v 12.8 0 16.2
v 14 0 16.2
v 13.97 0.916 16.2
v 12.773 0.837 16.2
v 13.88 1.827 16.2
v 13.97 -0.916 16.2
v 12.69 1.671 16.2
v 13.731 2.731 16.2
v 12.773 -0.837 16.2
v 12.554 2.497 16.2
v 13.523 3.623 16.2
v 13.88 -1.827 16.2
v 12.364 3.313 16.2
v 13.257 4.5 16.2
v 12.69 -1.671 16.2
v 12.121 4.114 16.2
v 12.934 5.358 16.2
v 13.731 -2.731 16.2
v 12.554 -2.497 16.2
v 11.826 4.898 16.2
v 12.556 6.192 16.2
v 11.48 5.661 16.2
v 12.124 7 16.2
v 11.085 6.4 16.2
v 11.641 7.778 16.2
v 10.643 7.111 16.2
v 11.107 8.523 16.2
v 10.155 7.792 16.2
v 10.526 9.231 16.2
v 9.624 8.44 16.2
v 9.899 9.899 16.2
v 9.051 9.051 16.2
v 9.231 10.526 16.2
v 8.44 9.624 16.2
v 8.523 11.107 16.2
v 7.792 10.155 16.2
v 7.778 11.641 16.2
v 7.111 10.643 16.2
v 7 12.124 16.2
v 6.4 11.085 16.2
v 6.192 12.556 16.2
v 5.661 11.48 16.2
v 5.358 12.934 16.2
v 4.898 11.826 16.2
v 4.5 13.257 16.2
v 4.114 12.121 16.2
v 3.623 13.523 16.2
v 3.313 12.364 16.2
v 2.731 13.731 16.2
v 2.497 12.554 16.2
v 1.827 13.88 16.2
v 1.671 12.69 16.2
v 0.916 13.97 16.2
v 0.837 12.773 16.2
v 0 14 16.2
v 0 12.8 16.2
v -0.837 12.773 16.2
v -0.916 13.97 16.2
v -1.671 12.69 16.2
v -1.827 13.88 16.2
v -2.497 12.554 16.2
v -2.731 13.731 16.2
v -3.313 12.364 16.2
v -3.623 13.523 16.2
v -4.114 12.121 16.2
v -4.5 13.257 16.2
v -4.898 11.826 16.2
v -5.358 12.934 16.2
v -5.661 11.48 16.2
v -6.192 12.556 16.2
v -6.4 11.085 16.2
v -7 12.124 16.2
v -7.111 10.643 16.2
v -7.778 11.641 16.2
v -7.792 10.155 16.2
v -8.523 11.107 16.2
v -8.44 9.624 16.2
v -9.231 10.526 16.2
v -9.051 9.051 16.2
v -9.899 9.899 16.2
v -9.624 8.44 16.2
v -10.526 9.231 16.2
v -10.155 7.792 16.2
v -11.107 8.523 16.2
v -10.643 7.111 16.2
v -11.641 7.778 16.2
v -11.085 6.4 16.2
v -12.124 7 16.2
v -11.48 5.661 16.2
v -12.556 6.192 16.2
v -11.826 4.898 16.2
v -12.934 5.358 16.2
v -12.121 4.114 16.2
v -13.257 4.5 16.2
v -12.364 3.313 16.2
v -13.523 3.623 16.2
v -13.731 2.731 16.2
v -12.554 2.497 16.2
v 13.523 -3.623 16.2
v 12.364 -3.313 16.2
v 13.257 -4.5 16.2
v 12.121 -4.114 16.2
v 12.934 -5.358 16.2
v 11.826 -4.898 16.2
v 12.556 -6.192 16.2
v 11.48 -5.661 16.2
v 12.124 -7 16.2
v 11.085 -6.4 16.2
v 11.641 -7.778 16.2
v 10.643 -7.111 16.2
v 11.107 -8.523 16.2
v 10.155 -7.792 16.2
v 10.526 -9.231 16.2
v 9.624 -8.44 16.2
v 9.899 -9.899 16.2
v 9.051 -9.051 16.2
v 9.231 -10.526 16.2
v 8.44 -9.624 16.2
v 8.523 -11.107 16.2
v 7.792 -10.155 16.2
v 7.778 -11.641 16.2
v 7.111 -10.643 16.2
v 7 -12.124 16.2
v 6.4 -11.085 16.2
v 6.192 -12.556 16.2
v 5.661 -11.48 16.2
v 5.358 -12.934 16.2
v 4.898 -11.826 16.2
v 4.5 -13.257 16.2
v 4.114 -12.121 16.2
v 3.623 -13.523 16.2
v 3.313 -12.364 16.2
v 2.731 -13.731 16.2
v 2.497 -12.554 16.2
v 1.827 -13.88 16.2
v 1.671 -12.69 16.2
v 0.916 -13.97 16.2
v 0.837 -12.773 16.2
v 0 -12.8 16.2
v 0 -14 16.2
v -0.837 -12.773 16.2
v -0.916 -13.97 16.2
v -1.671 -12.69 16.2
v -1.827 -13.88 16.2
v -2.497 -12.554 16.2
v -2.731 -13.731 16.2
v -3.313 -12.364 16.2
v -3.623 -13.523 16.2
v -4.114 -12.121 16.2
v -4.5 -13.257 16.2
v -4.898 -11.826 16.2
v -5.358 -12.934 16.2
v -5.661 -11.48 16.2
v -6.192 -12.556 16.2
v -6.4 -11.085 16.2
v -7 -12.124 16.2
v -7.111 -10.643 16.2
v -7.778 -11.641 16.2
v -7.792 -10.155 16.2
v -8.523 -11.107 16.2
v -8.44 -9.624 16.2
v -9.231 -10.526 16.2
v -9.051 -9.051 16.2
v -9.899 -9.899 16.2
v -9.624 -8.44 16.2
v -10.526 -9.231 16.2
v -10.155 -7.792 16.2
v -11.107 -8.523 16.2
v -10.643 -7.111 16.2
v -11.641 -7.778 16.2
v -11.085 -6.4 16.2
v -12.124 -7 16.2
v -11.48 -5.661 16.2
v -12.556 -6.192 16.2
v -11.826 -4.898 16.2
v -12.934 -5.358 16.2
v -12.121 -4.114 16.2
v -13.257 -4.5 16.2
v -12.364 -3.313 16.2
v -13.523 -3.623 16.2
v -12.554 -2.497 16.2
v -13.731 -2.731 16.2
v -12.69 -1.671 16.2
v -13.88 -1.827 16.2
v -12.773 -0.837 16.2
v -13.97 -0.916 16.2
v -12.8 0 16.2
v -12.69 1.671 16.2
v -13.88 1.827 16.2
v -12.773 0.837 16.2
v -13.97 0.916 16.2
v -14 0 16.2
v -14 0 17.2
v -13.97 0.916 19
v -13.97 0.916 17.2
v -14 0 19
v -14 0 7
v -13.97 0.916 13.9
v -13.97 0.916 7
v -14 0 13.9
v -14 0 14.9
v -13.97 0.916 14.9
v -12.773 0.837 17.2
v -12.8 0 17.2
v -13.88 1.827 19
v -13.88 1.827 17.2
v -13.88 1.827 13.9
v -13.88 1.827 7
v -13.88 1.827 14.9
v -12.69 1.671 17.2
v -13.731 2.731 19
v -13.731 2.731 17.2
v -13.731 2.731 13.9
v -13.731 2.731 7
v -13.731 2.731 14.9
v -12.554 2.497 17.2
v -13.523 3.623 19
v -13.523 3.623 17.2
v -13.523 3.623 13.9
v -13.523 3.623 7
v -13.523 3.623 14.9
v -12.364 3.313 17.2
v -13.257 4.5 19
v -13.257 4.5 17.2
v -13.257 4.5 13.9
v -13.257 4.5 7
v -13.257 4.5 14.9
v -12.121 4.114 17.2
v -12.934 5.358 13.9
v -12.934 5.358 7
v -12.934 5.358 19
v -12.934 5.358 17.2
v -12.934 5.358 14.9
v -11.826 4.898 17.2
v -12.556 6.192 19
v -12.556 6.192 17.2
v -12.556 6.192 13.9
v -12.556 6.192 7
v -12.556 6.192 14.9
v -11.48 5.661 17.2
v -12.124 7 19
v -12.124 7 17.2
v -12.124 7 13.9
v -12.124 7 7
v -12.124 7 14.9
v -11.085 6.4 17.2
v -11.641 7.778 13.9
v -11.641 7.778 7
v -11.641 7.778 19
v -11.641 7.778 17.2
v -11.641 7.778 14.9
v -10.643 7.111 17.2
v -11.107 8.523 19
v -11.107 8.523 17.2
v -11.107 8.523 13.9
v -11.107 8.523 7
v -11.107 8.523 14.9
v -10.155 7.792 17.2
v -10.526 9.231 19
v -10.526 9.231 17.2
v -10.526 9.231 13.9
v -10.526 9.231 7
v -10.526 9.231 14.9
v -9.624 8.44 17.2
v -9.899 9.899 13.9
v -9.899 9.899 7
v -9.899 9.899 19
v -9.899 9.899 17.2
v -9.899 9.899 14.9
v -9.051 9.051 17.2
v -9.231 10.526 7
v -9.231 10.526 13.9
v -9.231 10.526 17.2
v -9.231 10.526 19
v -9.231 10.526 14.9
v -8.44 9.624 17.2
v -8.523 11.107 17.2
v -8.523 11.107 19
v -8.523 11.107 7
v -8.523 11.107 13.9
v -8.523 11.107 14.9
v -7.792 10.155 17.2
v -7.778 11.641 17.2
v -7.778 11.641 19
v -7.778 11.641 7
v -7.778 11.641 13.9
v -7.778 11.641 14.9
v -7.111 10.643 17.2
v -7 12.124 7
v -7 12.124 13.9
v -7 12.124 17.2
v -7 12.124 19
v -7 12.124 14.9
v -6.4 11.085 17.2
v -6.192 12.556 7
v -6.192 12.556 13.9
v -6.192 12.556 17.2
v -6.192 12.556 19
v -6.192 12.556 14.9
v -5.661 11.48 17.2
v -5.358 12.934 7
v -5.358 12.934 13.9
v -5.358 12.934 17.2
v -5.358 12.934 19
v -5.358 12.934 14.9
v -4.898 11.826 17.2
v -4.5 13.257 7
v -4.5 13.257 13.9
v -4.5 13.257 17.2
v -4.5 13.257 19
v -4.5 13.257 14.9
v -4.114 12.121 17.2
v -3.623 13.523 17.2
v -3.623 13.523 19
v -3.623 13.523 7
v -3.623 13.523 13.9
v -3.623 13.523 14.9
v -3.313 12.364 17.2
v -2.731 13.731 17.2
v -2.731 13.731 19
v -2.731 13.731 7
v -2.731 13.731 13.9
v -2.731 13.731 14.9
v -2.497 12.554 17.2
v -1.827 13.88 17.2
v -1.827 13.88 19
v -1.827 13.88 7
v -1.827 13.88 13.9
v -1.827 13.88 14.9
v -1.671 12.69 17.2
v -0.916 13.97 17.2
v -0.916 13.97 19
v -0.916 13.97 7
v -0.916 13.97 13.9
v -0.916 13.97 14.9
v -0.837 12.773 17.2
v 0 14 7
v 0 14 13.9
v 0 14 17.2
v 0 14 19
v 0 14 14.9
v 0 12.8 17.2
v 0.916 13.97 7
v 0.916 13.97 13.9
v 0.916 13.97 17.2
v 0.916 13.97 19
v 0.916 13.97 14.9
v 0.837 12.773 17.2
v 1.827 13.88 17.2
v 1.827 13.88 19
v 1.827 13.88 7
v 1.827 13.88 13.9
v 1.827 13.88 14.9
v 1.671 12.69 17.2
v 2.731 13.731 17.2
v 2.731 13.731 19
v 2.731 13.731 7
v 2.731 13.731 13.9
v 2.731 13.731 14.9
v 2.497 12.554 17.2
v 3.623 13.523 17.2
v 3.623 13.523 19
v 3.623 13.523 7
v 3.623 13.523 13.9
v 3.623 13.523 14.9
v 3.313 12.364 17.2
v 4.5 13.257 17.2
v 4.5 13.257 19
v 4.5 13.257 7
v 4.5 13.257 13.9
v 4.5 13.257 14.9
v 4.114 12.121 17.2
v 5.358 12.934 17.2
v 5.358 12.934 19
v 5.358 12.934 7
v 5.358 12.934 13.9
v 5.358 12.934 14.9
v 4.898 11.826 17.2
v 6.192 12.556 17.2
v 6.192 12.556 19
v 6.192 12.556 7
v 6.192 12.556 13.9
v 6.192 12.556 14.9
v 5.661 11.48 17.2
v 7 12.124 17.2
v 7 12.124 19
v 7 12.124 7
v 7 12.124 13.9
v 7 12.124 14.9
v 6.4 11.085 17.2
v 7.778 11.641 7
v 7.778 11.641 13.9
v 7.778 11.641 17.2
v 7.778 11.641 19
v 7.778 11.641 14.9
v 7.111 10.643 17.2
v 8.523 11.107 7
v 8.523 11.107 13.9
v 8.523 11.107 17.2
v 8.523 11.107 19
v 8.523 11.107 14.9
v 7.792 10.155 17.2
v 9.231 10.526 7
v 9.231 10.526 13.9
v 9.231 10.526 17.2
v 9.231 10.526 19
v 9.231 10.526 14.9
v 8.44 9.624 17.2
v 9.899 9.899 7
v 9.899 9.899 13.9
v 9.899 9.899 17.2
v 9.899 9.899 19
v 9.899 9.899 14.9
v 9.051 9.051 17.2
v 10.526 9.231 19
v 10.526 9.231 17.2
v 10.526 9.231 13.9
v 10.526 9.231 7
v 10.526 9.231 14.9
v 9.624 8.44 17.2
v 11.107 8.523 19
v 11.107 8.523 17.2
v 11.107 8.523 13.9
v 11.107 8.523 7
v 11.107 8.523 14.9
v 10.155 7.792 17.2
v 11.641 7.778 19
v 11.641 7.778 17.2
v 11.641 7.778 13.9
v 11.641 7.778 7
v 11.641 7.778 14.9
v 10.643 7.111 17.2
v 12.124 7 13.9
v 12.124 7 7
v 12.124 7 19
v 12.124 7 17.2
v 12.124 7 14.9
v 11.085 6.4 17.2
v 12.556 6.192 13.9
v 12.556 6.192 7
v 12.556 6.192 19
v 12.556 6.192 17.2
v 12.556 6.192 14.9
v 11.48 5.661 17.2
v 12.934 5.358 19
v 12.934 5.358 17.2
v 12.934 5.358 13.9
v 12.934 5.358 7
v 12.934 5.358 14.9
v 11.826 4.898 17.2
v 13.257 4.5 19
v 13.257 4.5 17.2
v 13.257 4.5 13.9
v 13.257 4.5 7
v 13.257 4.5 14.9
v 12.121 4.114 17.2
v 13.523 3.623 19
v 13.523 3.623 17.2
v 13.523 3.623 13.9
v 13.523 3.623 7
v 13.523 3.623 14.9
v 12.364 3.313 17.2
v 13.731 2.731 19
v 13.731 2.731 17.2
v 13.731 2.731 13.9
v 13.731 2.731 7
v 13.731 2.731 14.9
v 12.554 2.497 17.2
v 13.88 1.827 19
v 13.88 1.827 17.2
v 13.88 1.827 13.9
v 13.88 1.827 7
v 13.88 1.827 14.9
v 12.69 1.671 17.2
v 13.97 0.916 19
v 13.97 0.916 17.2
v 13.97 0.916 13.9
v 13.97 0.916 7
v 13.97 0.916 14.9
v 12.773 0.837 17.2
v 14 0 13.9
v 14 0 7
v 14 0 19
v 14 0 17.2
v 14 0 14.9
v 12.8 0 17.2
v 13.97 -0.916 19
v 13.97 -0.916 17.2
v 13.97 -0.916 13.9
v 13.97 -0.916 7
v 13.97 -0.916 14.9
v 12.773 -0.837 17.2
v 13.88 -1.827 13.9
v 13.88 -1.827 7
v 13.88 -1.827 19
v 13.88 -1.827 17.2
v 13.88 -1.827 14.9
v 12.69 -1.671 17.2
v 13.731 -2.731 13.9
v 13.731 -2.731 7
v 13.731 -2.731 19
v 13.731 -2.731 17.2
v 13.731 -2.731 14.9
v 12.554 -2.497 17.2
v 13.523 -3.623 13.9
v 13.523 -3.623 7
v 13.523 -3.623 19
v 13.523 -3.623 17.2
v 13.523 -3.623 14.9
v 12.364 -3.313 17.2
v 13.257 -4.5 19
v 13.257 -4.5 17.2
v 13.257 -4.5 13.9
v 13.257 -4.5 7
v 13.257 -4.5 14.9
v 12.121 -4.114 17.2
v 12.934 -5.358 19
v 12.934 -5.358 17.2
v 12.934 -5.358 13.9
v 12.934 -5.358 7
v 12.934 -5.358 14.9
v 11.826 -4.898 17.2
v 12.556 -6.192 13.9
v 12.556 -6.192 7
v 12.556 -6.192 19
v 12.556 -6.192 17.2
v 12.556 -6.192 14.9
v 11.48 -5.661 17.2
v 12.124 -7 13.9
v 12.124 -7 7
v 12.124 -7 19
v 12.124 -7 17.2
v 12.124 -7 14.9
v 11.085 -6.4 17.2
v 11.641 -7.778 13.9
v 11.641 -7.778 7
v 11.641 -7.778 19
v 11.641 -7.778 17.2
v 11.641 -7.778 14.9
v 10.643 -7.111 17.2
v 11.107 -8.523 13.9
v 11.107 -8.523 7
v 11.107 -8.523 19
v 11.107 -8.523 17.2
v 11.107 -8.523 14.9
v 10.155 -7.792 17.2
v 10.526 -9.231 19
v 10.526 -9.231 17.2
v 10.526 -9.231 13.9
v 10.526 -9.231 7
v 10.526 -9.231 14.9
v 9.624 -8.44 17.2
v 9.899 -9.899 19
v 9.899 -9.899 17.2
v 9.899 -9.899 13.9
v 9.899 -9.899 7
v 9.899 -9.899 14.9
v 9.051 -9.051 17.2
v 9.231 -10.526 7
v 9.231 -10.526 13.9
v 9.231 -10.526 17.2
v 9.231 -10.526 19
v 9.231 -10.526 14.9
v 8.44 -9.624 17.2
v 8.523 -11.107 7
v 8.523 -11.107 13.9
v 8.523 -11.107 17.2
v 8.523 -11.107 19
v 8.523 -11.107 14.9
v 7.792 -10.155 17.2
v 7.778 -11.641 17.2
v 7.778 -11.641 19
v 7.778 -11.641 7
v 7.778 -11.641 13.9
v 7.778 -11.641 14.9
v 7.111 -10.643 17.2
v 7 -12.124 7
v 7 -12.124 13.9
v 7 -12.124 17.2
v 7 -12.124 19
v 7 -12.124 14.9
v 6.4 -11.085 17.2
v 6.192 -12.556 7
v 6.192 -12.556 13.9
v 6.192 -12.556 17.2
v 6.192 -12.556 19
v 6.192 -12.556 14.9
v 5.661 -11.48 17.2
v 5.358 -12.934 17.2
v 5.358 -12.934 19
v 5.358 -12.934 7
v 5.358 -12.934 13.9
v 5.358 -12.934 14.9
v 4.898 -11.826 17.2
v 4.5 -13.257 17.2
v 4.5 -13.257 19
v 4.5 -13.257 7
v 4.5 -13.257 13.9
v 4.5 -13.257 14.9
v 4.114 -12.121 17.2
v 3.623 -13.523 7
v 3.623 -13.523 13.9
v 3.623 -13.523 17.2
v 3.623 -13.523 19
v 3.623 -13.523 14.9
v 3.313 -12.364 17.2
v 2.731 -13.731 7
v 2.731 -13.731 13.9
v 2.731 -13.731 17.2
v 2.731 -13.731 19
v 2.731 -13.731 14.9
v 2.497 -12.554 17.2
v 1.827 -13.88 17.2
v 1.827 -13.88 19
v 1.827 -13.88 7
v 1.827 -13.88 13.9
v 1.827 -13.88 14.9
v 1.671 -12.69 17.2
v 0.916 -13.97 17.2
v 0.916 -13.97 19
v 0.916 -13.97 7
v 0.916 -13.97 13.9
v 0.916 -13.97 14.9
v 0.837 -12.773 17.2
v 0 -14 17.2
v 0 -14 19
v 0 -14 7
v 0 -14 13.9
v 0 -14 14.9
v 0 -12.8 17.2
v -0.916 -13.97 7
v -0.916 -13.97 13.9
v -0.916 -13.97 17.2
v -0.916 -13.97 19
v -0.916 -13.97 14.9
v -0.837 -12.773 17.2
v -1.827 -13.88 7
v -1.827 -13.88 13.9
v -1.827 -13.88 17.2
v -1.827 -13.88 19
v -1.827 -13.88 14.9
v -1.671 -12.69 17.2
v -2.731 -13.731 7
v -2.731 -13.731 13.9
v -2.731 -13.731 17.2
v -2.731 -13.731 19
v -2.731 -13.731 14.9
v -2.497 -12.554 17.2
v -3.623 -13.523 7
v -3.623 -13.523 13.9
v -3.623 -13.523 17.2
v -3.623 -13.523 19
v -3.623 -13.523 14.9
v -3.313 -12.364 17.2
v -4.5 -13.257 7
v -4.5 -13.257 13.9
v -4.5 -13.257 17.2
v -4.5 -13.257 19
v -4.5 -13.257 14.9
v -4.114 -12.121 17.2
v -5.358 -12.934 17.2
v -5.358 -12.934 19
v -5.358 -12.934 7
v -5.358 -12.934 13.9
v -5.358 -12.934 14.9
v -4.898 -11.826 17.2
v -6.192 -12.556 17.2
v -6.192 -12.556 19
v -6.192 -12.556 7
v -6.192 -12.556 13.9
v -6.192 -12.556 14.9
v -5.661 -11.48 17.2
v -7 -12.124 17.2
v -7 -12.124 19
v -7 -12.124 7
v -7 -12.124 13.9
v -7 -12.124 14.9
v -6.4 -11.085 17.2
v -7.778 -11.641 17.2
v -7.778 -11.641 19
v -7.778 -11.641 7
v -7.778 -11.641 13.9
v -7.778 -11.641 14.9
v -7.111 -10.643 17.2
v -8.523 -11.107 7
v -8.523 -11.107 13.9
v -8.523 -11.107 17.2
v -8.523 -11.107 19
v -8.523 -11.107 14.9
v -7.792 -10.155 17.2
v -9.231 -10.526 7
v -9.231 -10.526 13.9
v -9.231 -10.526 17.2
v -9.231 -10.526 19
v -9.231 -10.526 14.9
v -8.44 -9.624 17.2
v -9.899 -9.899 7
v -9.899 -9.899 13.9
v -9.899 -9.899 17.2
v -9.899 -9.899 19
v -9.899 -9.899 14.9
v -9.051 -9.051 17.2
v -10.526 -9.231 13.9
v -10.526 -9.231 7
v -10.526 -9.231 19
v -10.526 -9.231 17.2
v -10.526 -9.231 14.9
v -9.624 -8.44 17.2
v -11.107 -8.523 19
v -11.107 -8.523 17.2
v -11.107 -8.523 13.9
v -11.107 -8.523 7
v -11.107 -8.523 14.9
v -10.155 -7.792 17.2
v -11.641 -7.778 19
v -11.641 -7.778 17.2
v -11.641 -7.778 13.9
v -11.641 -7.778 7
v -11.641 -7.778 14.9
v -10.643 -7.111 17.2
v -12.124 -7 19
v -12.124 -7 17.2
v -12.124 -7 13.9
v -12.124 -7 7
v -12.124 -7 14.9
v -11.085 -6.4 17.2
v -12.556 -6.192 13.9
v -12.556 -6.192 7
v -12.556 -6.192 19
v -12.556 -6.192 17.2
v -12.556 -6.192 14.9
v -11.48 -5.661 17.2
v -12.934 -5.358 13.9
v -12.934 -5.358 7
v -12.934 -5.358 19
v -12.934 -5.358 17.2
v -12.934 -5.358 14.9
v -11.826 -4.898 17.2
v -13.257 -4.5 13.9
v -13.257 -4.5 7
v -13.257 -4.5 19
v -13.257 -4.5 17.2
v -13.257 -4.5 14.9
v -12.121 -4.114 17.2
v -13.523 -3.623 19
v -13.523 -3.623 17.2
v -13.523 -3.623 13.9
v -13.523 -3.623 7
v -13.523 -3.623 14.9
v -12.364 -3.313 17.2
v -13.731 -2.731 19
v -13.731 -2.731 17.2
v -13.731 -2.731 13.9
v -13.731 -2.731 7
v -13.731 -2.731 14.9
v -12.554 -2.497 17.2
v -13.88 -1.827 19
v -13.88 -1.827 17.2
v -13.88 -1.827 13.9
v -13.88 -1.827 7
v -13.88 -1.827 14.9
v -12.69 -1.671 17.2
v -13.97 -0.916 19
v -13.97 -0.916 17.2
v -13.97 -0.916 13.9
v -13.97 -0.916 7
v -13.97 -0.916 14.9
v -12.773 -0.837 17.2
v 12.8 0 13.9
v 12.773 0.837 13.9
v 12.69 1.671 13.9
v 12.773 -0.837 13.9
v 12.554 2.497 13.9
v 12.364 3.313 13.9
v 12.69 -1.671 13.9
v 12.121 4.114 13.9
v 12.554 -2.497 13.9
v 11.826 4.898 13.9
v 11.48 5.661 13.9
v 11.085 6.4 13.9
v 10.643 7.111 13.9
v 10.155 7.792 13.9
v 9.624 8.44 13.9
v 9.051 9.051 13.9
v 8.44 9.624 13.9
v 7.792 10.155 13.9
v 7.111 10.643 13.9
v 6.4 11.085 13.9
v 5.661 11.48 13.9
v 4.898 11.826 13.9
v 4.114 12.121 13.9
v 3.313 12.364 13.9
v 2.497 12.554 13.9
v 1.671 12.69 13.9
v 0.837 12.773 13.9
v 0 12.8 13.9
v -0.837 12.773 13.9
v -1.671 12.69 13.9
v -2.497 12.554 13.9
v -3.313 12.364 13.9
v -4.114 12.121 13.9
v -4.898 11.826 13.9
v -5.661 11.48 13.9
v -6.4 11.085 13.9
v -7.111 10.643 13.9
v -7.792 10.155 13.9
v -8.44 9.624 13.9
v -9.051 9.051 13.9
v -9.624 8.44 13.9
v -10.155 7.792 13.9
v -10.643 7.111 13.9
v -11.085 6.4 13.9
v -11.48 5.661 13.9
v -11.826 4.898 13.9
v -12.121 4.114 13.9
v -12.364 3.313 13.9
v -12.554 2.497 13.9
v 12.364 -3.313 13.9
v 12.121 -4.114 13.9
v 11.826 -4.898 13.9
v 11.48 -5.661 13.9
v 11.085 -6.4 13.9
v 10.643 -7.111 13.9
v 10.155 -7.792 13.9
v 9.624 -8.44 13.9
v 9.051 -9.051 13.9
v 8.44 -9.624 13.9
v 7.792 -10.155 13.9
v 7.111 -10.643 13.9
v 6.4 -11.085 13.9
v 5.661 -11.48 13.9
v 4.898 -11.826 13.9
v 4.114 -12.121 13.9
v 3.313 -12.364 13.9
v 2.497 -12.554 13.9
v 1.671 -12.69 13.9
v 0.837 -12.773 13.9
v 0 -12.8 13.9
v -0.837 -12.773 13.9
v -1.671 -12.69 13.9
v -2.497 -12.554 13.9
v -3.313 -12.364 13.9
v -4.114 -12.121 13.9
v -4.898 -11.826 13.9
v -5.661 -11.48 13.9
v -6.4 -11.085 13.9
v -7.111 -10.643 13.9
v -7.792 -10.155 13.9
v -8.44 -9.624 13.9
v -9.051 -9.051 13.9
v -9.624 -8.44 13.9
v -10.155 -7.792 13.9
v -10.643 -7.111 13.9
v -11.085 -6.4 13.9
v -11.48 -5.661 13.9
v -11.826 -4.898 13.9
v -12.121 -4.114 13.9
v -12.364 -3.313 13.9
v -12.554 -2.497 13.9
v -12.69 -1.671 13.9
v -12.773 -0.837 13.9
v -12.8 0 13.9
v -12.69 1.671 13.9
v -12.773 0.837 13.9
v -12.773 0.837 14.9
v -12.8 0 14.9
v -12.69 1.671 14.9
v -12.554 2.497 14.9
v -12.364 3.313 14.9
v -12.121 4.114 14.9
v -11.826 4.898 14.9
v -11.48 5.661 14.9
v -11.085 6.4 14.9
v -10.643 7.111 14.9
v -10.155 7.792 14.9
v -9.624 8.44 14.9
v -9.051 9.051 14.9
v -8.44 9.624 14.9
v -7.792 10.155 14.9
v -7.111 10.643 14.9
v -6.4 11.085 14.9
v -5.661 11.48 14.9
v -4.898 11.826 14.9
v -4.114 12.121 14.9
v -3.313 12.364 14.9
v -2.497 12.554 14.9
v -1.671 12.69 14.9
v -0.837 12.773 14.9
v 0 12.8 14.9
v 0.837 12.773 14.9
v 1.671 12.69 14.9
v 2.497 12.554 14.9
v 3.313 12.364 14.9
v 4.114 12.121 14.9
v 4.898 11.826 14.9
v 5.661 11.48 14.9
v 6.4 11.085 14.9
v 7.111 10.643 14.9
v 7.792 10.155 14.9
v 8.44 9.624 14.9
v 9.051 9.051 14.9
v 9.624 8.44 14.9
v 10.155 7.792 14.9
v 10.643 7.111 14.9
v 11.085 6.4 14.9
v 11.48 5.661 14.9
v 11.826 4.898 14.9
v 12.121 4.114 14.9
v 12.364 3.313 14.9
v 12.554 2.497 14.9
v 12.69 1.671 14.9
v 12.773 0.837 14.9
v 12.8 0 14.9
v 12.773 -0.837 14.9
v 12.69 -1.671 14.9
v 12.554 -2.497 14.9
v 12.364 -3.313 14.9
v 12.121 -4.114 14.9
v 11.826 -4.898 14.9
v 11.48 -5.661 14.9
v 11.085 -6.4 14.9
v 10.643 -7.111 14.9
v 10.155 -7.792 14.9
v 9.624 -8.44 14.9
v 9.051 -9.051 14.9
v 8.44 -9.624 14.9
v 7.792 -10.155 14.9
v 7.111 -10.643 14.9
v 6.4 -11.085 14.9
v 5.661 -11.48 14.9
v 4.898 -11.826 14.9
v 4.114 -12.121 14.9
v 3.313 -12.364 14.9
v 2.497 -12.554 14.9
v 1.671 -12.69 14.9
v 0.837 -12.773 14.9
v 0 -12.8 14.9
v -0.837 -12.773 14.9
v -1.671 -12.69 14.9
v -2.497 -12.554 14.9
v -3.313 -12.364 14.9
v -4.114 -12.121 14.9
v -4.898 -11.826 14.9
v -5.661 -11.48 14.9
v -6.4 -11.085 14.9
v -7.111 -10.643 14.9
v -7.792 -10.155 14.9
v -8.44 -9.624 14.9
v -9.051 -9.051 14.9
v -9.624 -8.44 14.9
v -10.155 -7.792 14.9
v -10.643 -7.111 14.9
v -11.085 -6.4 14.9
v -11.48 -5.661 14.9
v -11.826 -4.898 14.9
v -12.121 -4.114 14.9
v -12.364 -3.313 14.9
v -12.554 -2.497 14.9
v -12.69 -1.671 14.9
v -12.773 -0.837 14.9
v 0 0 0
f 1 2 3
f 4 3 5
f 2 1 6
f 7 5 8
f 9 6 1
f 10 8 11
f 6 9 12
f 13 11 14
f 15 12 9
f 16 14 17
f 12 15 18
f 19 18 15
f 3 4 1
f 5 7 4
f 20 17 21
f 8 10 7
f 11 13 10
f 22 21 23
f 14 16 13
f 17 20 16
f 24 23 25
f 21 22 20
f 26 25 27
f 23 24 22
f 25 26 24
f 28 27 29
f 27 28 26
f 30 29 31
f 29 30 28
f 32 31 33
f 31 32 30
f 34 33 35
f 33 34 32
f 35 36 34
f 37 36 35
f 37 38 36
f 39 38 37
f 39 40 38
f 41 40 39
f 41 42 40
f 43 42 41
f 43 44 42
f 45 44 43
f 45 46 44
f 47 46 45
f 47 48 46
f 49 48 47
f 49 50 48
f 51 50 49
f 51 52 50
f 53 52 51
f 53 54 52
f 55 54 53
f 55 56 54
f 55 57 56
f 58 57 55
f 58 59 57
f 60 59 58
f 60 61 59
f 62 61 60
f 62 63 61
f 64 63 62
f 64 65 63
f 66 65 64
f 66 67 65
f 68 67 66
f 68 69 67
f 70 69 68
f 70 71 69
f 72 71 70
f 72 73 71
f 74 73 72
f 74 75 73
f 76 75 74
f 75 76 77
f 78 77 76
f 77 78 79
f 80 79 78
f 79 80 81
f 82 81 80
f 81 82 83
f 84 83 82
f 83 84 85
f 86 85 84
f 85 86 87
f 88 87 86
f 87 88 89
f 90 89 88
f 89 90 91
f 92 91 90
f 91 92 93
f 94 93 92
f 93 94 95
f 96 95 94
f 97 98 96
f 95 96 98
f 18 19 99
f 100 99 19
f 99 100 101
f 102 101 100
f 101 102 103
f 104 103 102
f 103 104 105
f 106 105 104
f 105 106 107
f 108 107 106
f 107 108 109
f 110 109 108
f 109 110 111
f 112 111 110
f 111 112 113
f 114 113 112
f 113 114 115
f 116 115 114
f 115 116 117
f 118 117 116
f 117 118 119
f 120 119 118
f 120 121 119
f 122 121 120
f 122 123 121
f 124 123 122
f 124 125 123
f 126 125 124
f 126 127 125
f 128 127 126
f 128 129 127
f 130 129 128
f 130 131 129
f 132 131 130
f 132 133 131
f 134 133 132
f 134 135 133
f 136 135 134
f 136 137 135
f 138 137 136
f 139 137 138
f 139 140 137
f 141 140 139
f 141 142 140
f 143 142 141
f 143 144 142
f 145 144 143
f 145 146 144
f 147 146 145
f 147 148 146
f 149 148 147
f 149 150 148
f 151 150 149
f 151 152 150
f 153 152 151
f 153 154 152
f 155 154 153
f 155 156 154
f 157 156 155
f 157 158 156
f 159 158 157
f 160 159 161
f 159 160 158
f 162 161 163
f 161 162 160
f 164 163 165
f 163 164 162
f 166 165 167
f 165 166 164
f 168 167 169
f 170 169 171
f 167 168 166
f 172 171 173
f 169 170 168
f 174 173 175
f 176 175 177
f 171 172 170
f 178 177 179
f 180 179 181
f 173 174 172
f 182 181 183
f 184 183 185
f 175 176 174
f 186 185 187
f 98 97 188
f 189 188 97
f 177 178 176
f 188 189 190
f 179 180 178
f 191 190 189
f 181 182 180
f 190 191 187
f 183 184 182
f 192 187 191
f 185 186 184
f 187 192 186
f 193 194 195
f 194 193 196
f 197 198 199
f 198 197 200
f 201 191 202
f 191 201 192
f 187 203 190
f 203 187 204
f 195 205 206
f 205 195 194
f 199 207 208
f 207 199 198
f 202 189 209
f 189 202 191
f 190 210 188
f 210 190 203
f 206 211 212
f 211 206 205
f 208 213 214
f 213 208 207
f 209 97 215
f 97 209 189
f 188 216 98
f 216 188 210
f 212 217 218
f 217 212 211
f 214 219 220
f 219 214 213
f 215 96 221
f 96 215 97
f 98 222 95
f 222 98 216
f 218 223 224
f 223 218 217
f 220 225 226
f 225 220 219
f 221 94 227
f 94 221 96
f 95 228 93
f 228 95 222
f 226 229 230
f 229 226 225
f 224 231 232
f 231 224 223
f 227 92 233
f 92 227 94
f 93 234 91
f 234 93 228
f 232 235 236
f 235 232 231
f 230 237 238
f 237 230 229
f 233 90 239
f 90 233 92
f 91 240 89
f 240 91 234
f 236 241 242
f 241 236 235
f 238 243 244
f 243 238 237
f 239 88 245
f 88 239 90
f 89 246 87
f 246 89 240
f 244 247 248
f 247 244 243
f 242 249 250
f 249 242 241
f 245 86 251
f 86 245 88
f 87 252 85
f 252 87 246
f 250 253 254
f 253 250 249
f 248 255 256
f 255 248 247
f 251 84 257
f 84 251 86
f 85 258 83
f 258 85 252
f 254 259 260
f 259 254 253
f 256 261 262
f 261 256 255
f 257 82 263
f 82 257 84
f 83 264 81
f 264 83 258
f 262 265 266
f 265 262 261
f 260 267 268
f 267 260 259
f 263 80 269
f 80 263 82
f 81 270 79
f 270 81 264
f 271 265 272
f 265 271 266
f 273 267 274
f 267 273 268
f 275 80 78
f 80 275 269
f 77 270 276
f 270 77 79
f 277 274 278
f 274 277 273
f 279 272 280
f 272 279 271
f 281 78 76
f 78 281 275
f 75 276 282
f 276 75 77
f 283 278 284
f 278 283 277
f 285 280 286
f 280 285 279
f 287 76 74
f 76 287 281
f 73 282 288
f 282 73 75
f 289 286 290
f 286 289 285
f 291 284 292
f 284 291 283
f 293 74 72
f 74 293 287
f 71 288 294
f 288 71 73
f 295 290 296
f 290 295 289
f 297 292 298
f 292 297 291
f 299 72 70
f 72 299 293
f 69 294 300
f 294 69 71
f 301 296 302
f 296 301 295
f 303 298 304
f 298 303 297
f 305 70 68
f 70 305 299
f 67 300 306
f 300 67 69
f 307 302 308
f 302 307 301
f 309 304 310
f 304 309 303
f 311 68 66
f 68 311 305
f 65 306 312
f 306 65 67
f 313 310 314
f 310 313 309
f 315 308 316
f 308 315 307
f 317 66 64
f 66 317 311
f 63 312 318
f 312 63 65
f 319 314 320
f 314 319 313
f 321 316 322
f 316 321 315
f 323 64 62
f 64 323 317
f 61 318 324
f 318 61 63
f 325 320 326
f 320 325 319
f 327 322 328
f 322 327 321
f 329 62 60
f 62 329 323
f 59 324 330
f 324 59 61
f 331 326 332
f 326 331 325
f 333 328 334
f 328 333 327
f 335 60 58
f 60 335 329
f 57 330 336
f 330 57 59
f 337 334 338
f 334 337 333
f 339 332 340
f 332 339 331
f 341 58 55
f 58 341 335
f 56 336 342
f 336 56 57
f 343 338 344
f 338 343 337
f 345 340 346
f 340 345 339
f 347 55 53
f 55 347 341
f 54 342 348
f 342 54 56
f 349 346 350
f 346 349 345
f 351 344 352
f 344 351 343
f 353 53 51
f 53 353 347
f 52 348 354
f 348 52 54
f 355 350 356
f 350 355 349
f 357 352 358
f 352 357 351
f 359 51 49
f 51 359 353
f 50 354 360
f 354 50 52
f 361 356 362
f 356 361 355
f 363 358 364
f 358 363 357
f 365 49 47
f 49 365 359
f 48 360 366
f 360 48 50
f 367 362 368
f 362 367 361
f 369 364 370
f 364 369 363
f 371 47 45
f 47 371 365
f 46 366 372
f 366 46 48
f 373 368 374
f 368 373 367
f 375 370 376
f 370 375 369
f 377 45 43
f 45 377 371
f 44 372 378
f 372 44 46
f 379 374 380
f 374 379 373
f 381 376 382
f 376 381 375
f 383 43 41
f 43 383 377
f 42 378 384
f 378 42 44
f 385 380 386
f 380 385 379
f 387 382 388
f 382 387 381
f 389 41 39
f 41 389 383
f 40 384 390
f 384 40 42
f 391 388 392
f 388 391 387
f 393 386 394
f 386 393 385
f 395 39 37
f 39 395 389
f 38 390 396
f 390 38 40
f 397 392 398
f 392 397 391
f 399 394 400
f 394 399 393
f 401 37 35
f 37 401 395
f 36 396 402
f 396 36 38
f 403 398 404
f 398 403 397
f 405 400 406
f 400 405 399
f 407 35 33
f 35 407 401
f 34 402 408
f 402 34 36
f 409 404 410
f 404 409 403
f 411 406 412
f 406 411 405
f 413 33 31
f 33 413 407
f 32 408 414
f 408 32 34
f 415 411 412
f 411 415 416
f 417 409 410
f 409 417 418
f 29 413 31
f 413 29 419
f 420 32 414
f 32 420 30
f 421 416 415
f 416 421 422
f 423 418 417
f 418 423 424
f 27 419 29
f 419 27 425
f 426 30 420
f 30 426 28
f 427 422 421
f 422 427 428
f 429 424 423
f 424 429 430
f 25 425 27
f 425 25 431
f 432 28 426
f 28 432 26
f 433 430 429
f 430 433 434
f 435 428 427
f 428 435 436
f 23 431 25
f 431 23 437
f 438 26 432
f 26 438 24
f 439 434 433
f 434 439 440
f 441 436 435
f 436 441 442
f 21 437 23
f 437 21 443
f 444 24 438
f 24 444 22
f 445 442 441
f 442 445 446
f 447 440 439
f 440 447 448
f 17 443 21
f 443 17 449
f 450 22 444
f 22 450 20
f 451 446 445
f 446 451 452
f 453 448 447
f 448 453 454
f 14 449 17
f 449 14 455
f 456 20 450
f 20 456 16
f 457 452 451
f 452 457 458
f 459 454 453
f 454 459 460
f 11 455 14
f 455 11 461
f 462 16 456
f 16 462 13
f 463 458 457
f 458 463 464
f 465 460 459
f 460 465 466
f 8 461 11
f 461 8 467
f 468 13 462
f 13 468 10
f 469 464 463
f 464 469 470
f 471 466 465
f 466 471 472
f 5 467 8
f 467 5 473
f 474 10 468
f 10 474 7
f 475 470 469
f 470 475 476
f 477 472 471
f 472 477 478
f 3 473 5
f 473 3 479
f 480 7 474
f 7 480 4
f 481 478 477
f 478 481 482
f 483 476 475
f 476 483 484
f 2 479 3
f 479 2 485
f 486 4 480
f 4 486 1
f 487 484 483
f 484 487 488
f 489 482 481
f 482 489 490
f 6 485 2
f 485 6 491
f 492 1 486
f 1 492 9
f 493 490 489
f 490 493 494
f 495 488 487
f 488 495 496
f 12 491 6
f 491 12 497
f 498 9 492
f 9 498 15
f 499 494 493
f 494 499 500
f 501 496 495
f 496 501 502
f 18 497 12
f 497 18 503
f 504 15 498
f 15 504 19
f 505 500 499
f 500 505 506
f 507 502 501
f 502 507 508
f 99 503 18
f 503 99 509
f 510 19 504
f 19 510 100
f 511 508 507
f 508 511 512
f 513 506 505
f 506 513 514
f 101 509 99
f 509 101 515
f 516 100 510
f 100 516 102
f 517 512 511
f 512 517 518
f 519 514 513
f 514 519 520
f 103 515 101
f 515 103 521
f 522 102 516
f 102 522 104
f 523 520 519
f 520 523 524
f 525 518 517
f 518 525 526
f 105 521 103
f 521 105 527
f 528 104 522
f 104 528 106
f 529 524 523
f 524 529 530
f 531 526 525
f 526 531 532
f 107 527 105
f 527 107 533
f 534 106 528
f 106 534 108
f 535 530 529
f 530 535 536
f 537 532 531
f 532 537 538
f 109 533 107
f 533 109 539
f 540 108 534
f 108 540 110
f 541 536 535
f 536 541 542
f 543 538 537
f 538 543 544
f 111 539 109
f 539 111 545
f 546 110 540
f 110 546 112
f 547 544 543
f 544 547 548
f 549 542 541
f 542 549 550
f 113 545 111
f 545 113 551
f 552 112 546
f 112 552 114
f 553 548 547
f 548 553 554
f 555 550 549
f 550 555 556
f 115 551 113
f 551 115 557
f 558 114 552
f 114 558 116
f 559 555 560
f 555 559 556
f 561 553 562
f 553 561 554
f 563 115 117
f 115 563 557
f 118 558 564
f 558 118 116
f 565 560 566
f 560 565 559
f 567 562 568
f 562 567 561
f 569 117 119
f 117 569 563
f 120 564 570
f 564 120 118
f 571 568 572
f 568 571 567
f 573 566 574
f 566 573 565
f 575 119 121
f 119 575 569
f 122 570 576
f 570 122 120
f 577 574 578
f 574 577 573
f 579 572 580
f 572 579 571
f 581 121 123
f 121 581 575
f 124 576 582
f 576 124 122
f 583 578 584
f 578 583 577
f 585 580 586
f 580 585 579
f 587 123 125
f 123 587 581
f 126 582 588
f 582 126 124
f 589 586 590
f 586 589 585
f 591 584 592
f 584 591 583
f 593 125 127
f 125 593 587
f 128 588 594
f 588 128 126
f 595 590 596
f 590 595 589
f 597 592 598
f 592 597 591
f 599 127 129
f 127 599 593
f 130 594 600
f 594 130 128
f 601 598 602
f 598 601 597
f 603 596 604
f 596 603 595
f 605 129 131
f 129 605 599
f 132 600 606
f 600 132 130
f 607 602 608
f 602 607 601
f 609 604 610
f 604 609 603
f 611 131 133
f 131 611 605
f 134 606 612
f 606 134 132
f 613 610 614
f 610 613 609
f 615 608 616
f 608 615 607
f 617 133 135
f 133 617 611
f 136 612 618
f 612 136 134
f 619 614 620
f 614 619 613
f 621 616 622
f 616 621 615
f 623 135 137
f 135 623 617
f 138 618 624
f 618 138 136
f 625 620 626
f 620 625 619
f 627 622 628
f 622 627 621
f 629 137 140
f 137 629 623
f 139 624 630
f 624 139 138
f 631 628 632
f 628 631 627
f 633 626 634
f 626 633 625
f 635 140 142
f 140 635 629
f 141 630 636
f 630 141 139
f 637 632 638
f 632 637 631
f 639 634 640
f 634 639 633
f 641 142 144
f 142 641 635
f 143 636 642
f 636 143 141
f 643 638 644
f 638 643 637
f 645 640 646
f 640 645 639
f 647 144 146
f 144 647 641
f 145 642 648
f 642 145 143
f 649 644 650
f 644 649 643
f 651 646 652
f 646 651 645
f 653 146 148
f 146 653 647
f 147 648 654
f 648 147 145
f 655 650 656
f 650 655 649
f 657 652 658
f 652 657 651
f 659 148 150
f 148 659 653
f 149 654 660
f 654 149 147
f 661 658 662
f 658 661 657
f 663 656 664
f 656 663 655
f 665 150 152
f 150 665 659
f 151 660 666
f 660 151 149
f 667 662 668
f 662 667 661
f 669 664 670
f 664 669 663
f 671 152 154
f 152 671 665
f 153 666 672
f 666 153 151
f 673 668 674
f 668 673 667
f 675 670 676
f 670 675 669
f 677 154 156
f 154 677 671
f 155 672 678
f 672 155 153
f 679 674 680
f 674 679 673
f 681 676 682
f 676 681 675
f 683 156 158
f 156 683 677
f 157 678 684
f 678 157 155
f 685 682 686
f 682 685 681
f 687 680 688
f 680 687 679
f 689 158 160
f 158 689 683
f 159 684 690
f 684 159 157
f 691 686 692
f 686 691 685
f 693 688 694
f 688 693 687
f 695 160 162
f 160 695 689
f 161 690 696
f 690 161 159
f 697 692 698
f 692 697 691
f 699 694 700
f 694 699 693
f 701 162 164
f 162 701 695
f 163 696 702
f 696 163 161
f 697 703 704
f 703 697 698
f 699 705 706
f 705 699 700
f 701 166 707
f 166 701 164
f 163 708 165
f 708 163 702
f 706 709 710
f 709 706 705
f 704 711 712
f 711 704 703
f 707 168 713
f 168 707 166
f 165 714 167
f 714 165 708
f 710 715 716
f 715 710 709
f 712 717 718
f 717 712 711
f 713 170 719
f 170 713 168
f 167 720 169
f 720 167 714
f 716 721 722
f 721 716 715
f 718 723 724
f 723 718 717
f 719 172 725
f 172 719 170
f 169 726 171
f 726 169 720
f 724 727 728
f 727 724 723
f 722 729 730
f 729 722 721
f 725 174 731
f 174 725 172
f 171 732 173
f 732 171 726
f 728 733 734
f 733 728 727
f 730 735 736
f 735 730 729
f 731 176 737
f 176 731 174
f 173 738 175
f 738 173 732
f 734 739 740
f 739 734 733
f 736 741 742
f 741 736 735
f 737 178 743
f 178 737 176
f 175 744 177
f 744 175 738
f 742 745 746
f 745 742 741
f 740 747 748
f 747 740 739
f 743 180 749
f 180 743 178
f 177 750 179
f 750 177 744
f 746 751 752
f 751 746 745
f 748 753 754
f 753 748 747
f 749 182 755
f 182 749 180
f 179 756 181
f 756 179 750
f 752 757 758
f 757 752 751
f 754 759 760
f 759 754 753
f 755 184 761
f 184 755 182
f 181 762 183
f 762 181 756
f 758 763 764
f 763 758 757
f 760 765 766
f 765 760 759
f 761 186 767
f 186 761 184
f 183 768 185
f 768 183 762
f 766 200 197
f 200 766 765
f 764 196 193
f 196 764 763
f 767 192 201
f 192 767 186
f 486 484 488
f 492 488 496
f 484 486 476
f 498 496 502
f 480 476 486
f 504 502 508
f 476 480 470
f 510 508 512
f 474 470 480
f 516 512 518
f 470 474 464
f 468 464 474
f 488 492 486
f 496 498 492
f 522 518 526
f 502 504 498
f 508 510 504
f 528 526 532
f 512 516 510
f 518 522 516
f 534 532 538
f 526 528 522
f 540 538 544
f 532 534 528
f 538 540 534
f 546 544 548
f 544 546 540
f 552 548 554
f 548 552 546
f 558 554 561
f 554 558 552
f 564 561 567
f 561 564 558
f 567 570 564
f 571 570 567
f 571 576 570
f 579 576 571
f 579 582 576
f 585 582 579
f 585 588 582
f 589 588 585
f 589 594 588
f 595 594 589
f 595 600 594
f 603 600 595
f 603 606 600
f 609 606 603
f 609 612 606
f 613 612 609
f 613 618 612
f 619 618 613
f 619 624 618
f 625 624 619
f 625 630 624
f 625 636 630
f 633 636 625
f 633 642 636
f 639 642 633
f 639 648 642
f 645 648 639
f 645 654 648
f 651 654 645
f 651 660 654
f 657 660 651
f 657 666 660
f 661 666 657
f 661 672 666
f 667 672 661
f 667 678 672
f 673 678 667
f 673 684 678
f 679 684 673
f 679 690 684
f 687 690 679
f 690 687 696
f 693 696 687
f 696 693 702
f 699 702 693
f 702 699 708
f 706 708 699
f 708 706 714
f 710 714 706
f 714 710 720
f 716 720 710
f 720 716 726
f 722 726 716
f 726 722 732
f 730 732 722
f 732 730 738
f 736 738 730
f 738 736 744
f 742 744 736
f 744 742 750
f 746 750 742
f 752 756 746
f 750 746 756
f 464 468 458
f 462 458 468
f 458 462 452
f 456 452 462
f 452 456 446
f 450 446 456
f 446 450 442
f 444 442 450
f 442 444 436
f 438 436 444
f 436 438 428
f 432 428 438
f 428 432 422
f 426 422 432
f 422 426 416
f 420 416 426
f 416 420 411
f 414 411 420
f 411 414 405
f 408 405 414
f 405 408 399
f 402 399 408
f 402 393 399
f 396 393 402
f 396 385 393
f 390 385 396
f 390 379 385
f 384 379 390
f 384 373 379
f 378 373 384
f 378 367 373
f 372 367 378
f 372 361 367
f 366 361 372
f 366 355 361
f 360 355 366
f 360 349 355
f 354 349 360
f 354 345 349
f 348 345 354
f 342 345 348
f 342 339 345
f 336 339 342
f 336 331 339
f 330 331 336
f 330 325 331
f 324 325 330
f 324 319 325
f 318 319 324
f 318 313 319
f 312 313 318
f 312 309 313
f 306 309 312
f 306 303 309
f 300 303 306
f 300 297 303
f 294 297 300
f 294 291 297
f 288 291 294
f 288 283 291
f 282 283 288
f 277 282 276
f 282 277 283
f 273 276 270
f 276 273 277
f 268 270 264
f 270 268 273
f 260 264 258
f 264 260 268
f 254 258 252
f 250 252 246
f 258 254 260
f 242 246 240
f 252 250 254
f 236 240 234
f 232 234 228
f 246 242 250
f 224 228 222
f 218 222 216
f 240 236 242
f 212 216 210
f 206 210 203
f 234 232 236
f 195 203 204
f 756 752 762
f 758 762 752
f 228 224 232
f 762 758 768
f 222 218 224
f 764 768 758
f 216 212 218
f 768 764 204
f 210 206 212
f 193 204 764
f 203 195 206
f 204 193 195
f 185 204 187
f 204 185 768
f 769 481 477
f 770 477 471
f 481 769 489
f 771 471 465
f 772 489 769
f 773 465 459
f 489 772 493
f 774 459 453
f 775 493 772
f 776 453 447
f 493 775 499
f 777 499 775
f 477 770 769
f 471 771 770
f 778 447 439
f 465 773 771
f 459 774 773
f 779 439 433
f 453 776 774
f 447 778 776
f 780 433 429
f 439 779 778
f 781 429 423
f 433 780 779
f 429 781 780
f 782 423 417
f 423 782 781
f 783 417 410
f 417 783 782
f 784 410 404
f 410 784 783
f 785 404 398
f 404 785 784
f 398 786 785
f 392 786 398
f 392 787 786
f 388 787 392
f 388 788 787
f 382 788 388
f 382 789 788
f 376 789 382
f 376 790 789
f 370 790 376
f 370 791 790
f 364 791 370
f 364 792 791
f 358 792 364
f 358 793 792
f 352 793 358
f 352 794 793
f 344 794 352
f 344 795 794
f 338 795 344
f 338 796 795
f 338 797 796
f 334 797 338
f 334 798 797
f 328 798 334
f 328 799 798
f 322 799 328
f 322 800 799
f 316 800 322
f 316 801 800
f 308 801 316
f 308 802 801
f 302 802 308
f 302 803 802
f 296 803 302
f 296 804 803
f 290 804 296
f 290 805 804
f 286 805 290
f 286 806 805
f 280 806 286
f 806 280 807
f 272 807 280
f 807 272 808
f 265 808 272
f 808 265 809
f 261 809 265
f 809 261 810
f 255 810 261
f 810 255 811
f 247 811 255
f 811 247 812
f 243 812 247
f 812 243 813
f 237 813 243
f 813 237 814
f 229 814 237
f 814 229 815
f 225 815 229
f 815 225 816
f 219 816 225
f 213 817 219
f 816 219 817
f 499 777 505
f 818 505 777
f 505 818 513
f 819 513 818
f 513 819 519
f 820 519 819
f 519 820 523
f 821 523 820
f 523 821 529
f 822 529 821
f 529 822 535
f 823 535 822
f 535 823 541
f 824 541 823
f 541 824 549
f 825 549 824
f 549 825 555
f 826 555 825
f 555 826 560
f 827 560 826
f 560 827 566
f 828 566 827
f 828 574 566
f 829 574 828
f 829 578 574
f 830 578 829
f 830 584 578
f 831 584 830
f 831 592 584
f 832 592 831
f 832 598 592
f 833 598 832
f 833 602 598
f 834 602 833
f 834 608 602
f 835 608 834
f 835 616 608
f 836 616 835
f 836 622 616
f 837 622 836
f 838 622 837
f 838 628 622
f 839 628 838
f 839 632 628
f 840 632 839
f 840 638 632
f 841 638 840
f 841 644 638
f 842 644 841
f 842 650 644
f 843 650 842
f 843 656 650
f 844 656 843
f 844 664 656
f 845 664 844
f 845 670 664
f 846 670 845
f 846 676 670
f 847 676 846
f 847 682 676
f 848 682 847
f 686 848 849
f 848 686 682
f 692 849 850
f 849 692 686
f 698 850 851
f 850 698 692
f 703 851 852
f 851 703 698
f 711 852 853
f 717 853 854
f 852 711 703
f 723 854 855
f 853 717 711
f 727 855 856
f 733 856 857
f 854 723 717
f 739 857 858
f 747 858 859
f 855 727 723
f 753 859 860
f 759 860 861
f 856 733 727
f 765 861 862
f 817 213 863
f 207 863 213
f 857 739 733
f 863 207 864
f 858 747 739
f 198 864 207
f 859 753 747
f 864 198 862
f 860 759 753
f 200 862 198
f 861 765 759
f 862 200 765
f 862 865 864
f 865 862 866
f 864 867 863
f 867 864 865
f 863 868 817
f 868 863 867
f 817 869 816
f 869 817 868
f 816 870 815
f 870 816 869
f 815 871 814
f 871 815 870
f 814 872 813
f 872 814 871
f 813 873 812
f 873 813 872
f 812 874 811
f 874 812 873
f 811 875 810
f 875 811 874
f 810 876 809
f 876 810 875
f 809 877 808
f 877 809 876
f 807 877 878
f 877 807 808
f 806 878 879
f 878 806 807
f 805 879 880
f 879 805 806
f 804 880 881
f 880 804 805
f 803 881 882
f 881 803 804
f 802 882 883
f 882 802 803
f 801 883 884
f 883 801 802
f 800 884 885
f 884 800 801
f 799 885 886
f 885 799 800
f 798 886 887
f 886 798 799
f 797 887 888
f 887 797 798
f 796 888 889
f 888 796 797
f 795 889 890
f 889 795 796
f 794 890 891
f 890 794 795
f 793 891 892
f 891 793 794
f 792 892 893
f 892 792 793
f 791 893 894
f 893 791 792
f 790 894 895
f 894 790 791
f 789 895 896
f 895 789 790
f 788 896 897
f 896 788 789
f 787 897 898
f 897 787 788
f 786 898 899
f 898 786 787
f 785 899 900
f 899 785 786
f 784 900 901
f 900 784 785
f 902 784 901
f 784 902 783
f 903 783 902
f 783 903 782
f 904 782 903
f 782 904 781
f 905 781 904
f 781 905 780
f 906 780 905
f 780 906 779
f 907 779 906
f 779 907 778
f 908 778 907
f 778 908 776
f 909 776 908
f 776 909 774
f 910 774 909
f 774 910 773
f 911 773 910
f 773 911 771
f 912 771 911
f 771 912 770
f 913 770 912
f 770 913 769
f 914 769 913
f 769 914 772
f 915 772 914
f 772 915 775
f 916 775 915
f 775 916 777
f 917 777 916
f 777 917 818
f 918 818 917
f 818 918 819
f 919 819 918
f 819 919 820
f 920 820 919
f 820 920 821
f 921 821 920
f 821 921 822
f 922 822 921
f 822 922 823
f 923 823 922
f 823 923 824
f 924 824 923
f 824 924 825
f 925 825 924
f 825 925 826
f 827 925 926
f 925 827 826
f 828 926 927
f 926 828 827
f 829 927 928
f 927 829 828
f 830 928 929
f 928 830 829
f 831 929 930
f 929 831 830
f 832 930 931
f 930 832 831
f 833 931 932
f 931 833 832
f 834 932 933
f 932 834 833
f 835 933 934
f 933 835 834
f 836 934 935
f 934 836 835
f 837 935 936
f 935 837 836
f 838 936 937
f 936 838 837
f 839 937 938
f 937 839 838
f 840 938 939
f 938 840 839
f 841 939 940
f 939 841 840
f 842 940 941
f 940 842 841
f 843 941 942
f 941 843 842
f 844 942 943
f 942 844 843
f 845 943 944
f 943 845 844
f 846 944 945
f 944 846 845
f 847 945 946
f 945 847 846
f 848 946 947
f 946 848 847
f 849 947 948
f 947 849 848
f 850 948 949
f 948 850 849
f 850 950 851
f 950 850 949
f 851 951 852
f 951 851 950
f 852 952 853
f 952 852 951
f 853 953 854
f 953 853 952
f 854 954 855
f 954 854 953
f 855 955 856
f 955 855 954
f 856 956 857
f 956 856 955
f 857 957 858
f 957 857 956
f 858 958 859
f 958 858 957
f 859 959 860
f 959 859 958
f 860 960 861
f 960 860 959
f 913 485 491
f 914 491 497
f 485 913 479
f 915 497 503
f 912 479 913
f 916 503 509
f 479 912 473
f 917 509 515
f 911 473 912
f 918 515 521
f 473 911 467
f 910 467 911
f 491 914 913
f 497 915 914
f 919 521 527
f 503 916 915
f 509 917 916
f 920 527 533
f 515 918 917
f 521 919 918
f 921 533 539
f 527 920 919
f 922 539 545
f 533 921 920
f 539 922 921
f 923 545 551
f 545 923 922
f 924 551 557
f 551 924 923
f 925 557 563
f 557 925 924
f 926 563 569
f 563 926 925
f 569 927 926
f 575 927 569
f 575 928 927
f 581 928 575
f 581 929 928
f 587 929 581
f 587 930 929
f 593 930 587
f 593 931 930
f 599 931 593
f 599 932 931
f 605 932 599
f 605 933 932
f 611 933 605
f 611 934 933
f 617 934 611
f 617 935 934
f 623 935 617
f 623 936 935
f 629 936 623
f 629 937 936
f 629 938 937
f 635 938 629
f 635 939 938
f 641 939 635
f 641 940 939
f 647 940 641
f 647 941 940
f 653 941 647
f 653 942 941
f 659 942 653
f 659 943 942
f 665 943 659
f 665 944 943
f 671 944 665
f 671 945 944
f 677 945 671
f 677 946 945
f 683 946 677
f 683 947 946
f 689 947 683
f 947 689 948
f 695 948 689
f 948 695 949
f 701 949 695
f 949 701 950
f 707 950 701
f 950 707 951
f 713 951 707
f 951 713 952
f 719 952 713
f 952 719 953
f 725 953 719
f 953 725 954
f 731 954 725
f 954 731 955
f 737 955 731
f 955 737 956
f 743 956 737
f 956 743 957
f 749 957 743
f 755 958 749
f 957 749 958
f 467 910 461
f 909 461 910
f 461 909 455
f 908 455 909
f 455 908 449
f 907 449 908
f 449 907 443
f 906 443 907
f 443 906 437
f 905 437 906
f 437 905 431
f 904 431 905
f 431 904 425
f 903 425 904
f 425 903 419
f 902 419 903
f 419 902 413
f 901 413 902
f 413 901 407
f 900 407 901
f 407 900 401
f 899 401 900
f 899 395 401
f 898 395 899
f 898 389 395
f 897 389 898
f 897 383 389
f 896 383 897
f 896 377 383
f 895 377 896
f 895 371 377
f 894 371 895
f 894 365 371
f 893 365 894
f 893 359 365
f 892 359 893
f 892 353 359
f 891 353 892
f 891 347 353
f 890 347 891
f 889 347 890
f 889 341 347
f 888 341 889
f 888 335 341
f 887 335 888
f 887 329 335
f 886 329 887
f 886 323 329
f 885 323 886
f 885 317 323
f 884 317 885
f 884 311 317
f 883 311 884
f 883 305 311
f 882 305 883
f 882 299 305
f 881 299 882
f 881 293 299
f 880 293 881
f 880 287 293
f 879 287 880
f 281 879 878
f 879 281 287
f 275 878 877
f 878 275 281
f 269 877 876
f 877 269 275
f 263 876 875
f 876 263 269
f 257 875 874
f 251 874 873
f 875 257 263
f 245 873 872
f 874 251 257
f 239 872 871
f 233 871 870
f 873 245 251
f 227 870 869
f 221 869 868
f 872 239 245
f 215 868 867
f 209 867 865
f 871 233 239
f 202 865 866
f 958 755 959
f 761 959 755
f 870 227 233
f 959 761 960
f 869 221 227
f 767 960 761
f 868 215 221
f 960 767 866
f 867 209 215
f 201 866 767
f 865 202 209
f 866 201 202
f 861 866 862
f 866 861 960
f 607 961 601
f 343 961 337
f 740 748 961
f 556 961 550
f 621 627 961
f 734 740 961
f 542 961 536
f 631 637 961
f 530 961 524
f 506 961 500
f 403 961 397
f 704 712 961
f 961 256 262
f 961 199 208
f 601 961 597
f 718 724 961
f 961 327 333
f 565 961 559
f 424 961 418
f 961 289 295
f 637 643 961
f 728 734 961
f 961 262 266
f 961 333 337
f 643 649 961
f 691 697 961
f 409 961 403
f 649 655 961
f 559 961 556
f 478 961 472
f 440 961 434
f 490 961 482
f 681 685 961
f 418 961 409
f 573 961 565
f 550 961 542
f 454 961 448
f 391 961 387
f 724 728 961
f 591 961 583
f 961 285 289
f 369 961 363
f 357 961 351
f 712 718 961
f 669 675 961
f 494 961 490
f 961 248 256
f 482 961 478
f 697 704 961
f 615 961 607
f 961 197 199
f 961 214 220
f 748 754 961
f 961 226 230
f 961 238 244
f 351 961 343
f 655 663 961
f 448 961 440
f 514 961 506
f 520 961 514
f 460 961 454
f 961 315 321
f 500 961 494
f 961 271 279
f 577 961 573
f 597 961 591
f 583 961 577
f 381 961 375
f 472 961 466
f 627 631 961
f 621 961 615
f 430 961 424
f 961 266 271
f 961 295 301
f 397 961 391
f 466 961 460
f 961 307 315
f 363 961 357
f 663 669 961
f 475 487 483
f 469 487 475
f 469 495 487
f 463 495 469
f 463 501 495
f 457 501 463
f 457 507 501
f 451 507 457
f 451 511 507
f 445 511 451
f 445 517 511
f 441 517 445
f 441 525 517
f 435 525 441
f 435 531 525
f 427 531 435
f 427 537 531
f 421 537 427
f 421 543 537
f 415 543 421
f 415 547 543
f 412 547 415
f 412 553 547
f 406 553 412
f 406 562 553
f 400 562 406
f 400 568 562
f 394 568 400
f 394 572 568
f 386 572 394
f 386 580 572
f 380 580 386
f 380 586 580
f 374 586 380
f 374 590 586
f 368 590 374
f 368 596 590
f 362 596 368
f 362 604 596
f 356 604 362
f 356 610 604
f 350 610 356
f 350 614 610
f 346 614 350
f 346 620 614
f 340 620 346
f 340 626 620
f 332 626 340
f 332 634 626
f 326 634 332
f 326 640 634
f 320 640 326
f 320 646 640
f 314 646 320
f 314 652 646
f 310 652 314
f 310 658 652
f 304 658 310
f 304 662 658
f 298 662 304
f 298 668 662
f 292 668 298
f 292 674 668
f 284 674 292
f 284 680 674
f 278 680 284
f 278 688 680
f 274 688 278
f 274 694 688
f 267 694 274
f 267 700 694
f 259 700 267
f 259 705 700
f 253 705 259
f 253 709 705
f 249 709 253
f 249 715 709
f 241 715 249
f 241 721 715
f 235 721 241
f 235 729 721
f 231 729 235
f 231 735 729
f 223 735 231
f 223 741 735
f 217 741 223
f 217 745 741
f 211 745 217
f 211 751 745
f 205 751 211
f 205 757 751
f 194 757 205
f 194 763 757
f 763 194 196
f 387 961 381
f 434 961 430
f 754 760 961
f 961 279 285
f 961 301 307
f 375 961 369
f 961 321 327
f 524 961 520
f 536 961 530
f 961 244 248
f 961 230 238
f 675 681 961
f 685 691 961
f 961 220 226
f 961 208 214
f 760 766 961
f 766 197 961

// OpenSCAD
// file: grooves.scad
include <config.scad>;

function groove_z(index) =
    head_length - groove_back_offset - groove_width - index * (groove_width + groove_spacing);

module groove_cut(z_position) {
    translate([0, 0, z_position])
        rotate_extrude()
            translate([head_radius - groove_depth, 0, 0])
                square([groove_depth, groove_width]);
}

module decorative_grooves() {
    assert(
        groove_count == 0 || groove_z(groove_count - 1) >= nose_length,
        "Grooves extend into the tapered nose; reduce groove_count or spacing."
    );

    for (index = [0 : groove_count - 1]) {
        groove_cut(groove_z(index));
    }
}
// file: config.scad
head_radius = 14;
nose_length = 7;
straight_section_length = 12;
head_length = nose_length + straight_section_length;

groove_count = 2;
groove_depth = 1.2;
groove_width = 1.0;
groove_spacing = 1.3;
groove_back_offset = 1.8;

$fn = 96;
// main file
include <config.scad>;
use <grooves.scad>;

module head_body() {
    rotate_extrude()
        polygon([
            [0, 0],
            [head_radius, nose_length],
            [head_radius, head_length],
            [0, head_length]
        ]);
}

difference() {
    head_body();
    decorative_grooves();
}
